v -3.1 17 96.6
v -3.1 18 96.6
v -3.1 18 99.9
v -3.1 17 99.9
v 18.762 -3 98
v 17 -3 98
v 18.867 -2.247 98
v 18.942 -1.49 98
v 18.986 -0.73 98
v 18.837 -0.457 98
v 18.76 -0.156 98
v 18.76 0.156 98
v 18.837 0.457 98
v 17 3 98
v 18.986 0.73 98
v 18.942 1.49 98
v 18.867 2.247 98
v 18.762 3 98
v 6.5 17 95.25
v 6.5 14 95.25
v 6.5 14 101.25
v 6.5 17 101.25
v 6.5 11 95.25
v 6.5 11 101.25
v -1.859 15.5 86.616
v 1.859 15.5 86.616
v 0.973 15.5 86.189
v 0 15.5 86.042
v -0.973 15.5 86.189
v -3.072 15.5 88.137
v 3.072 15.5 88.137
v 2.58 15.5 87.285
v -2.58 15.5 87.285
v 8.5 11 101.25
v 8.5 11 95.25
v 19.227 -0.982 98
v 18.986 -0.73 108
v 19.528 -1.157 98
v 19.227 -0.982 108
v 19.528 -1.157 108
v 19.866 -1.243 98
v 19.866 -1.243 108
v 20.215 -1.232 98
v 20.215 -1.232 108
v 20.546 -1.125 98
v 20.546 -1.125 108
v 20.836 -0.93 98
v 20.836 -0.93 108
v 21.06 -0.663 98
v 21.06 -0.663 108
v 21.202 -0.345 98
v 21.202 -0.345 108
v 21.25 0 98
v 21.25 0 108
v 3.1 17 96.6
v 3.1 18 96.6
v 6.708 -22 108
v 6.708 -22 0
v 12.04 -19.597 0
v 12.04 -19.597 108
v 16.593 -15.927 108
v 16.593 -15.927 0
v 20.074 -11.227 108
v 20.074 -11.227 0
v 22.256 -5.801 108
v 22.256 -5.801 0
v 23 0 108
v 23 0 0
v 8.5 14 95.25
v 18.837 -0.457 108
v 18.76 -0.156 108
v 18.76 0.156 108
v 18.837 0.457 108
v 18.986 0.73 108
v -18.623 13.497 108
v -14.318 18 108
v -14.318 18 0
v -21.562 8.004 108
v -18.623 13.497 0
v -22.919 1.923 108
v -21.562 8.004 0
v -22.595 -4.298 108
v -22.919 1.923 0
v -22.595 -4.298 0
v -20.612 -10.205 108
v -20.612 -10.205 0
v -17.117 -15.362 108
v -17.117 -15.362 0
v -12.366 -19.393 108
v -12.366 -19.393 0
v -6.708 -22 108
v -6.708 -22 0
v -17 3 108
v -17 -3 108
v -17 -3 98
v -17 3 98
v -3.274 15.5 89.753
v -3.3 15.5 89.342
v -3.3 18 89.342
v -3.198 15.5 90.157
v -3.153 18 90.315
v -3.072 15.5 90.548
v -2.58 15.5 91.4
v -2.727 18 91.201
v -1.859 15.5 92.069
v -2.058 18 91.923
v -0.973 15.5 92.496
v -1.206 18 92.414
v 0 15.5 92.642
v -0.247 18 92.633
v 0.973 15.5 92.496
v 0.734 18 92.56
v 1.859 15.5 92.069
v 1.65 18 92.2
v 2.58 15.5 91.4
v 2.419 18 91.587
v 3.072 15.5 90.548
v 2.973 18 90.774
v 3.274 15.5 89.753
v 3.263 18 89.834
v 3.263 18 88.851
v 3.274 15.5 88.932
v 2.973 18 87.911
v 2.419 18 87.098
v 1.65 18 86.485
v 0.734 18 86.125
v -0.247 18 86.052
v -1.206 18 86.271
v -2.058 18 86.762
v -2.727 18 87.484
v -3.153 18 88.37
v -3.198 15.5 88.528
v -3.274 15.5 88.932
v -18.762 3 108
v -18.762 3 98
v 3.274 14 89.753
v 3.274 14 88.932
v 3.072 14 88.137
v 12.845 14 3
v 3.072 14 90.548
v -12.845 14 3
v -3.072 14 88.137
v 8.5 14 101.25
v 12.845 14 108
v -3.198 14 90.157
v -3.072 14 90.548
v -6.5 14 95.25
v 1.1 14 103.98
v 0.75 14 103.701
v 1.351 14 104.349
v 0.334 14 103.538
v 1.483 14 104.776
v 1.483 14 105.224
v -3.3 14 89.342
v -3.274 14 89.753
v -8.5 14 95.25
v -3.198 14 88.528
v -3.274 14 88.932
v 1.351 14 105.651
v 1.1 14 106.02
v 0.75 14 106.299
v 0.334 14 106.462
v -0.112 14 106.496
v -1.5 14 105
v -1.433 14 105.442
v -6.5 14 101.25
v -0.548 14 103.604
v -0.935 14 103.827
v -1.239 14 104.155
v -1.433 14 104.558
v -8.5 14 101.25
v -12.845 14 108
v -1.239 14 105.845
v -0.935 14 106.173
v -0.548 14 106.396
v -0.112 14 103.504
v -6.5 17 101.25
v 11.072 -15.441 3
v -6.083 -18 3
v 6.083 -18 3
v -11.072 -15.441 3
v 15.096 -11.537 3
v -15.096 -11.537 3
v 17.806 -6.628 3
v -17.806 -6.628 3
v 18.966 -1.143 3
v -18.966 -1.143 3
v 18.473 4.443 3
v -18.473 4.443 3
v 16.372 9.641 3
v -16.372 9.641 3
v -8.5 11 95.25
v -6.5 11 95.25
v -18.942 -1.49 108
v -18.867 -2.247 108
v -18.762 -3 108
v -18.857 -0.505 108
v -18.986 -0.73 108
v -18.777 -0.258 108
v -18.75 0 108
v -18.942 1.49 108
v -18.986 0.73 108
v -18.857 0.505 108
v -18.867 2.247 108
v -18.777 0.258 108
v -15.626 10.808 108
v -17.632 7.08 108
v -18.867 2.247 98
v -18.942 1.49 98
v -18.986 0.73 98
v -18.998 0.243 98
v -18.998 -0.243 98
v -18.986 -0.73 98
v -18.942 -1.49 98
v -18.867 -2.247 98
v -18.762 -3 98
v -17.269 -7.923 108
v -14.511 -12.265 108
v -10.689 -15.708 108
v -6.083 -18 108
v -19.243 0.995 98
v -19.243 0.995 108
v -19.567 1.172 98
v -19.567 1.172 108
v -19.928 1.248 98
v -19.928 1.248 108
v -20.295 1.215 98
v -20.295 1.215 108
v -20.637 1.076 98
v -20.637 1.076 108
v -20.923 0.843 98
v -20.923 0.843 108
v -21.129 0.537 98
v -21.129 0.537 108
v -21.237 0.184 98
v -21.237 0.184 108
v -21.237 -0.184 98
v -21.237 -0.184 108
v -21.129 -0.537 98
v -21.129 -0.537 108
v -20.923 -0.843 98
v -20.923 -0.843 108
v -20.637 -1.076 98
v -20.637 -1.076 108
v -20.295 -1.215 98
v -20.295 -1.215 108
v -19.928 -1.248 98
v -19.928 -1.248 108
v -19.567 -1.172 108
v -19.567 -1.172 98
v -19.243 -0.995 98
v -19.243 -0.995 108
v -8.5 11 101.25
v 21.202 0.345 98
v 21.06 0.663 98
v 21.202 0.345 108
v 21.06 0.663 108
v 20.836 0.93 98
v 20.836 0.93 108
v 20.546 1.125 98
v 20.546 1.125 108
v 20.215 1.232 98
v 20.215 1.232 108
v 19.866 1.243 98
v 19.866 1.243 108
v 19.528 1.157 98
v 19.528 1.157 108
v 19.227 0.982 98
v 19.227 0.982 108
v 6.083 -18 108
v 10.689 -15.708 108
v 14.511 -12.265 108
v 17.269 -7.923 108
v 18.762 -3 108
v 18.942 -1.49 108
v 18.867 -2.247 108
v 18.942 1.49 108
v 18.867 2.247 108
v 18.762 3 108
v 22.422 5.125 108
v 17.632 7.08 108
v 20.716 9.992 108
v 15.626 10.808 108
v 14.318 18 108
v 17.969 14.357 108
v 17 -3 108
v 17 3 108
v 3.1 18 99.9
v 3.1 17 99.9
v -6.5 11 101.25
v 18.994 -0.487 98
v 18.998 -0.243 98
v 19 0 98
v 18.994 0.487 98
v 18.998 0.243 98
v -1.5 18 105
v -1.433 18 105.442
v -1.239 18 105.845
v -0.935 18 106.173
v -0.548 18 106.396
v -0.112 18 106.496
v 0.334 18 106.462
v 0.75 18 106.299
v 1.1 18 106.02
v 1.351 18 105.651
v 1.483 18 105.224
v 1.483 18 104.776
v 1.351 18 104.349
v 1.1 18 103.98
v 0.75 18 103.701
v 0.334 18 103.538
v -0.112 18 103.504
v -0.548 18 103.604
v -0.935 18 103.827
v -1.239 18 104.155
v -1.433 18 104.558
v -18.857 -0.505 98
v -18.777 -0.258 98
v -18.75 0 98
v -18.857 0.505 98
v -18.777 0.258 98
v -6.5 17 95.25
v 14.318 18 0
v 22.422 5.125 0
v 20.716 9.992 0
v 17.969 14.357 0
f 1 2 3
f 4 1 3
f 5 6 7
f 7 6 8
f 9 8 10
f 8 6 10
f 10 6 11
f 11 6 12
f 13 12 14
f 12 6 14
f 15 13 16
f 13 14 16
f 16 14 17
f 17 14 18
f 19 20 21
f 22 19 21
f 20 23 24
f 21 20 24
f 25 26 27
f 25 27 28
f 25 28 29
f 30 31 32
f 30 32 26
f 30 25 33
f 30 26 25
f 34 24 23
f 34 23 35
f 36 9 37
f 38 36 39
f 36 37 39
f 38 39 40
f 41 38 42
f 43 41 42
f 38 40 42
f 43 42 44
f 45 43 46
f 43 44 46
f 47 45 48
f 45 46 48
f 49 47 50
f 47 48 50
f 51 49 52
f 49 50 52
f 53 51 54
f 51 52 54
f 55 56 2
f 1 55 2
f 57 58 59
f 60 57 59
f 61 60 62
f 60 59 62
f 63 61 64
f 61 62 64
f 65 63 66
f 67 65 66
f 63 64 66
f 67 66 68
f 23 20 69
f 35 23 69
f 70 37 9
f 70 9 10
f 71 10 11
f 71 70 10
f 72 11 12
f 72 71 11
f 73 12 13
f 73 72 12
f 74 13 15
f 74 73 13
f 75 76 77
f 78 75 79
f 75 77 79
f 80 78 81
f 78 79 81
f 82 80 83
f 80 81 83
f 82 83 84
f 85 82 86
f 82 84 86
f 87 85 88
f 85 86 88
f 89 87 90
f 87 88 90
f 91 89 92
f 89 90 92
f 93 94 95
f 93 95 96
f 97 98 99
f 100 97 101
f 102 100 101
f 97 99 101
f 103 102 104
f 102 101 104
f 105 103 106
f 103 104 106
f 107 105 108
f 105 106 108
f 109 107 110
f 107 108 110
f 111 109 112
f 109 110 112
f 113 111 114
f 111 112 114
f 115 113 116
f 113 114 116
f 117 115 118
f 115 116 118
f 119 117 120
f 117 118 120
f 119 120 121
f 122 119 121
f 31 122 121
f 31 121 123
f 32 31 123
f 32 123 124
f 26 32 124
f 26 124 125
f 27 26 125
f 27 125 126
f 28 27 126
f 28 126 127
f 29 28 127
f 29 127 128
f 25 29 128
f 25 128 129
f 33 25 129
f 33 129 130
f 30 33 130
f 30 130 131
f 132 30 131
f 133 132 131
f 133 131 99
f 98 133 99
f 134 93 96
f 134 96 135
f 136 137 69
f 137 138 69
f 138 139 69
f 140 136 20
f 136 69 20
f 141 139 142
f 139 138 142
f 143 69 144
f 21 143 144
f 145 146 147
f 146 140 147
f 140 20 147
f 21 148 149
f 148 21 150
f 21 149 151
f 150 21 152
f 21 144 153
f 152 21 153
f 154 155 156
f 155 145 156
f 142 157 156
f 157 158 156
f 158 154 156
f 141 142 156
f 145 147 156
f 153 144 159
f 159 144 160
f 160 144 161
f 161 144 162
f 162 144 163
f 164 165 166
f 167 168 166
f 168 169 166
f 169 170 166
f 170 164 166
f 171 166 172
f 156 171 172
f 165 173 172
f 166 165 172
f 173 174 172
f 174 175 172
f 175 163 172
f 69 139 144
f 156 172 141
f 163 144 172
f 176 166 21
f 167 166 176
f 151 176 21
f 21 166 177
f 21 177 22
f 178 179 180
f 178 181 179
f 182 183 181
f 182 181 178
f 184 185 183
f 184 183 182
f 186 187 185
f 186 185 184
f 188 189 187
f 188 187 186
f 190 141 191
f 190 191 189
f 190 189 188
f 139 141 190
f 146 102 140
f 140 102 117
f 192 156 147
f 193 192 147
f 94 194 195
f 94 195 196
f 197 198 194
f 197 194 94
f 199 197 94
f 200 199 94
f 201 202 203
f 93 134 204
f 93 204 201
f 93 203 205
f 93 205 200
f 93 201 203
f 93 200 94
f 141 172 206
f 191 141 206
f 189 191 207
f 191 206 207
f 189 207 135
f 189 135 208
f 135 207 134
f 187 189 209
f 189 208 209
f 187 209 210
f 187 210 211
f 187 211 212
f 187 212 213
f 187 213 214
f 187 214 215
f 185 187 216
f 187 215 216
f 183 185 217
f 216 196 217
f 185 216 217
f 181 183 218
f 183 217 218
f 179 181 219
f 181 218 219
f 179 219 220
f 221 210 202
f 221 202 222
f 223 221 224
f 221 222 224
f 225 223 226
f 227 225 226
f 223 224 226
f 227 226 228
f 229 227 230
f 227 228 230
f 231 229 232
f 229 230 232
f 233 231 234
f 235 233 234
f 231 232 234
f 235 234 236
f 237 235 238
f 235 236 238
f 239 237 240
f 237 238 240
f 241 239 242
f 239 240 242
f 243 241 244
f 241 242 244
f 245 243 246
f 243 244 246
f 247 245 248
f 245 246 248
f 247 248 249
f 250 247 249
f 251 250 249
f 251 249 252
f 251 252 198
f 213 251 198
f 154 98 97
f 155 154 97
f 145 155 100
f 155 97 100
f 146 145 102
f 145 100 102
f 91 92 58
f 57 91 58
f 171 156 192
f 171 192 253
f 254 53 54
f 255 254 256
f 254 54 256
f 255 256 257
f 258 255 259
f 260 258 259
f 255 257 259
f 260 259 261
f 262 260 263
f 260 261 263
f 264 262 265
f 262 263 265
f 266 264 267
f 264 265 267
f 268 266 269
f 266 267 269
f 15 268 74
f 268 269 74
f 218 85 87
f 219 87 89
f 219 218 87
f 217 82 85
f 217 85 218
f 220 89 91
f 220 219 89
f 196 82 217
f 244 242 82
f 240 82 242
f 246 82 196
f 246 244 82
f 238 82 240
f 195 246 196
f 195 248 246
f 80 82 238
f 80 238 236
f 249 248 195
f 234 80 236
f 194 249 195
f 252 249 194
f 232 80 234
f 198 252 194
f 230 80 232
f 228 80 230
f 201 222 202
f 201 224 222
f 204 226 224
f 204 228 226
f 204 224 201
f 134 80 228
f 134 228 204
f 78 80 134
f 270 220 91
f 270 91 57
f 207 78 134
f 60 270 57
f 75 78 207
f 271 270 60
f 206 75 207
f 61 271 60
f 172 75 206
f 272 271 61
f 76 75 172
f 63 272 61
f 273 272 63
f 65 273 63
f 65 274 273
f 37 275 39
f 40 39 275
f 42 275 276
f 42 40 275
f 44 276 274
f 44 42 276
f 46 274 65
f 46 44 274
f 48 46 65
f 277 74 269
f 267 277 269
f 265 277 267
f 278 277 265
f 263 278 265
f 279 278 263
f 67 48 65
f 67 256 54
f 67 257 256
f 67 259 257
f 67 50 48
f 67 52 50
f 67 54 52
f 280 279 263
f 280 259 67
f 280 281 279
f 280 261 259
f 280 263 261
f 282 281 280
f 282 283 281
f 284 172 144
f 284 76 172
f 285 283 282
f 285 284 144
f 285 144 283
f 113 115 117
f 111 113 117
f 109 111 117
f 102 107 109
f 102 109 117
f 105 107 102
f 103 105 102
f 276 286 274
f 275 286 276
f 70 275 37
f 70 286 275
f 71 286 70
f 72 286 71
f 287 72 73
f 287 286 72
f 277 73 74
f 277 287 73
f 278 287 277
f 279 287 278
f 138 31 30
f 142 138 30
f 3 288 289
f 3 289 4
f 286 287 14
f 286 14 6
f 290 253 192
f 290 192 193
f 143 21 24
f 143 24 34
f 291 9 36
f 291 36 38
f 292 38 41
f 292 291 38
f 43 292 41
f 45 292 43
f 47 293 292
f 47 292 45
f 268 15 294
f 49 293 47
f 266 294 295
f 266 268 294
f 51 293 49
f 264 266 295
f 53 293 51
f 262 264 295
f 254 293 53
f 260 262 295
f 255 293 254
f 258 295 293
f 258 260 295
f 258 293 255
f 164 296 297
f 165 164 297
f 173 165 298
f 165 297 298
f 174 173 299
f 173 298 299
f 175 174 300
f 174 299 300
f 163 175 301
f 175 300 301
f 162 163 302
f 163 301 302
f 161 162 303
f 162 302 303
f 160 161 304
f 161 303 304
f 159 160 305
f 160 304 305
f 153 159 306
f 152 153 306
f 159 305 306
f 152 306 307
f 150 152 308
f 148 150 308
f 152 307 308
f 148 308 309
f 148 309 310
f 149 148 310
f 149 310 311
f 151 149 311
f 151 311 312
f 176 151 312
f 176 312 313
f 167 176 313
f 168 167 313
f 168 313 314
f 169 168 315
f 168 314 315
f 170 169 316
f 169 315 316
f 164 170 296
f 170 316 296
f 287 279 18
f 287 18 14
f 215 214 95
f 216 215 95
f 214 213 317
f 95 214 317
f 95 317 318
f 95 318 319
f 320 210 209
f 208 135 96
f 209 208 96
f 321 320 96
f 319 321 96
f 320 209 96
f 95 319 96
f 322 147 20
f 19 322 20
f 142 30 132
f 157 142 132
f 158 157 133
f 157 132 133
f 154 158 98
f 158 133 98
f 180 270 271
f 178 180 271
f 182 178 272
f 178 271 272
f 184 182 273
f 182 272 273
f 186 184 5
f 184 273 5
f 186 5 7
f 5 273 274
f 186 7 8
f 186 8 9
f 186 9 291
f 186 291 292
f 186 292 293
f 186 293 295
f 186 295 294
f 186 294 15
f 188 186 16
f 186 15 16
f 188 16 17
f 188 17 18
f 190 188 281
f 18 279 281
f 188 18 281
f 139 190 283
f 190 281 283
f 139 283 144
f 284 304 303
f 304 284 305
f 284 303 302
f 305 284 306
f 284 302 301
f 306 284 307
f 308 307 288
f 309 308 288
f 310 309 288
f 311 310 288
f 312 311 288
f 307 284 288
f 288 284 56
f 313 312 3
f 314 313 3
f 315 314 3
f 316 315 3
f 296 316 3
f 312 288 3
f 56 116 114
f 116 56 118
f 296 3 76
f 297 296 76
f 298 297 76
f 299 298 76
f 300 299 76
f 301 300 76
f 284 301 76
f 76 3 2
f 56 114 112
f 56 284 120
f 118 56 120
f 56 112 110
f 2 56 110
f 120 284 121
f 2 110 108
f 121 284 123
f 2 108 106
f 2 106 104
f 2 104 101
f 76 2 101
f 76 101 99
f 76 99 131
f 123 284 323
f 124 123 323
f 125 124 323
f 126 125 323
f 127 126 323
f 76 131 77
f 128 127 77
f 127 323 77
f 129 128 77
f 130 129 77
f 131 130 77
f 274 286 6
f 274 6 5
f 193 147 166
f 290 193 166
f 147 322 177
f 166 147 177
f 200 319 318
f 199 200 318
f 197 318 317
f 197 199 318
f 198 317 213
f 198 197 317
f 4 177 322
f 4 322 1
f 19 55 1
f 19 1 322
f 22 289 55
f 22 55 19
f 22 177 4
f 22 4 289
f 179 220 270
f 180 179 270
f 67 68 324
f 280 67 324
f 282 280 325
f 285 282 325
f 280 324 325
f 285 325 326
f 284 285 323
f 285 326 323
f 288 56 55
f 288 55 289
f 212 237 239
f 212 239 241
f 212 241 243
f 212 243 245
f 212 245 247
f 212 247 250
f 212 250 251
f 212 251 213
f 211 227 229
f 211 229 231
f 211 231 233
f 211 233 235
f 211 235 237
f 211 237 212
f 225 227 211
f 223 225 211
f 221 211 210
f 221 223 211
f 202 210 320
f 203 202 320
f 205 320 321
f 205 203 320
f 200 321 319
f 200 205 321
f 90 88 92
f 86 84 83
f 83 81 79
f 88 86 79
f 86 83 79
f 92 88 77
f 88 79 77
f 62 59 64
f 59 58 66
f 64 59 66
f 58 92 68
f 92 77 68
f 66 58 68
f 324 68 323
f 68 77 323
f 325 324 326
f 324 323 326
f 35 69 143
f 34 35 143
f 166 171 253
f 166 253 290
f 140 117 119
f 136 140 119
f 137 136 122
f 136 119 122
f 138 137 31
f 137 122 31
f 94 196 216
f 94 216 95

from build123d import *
from build123d import SkipClean  # not in build123d's __all__

# Parameters (mm, degrees)
F1_DEPTH  = 108
F3_DEPTH  = 105
F4_W      = 6.2
F4_H      = 3.3
F5_DEPTH  = 4
F4_R      = 3.3
F6_DEPTH  = 2.5
F8_DEPTH  = 1.5
F4_R_2    = 1.5
F9_DEPTH  = 4
F10_W     = 13
F10_H     = 6
F10_W_2   = 6.2
F10_H_2   = 3.3
F11_DEPTH = 3
F10_W_3   = 2
F12_DEPTH = 3
F14_DEPTH = 10
F15_DEPTH = 10


# Not quite as in the source:
# - a feature names something its author has since deleted; it is built from what else it names


with BuildPart() as f1:
    # F0 (on Top) → F1 (new body)
    with BuildSketch(Plane.XY):
        with BuildLine():
            ThreePointArc((6.7082039325, -22), (18.4836237038, -13.6877921805), (23, 0))
            ThreePointArc((23, 0), (20.7160551802, 9.9922498854), (14.3178210633, 18))
            Line((14.3178210633, 18), (-14.3178210633, 18))
            ThreePointArc((-14.3178210633, 18), (-22.5947655837, -4.2984378813), (-6.7082039325, -22))
            Line((-6.7082039325, -22), (6.7082039325, -22))
        make_face()
    extrude(amount=F1_DEPTH)

    # F2 (on face) → F3 (cut)
    with BuildSketch(Plane.XY.offset(108)):
        with BuildLine():
            Line((-6.0827625303, -18), (6.0827625303, -18))
            ThreePointArc((6.0827625303, -18), (18.5894391984, -3.9284539311), (12.8452325787, 14))
            Line((12.8452325787, 14), (-12.8452325787, 14))
            ThreePointArc((-12.8452325787, 14), (-18.5894391984, -3.9284539311), (-6.0827625303, -18))
        make_face()
    extrude(amount=-F3_DEPTH, mode=Mode.SUBTRACT)

    # F4 (on face) → F5 (cut)
    with BuildSketch(Plane(origin=(0, 18, 0), x_dir=(-1, 0, 0), z_dir=(0, 1, 0))):
        with Locations((0, 98.25)):
            Rectangle(F4_W, F4_H)
    extrude(amount=-F5_DEPTH, mode=Mode.SUBTRACT)

    # F4 (on face) → F6 (cut)
    with BuildSketch(Plane(origin=(0, 18, 0), x_dir=(-1, 0, 0), z_dir=(0, 1, 0))):
        with Locations((0, 89.3424802274)):
            Circle(F4_R)
    extrude(amount=-F6_DEPTH, mode=Mode.SUBTRACT)

    # F7 (on face) → F8 (cut)
    with BuildSketch(Plane(origin=(0, 15.5, 0), x_dir=(-1, 0, 0), z_dir=(0, 1, 0))):
        with BuildLine():
            ThreePointArc((3.3, 89.3424802274), (3.2424742607, 89.9559626385), (3.0719026249, 90.5480565471))
            Line((3.0719026249, 90.5480565471), (-3.0719026249, 90.5480565471))
            ThreePointArc((-3.0719026249, 90.5480565471), (-3.3, 89.3424802274), (-3.0719026249, 88.1369039076))
            Line((-3.0719026249, 88.1369039076), (3.0719026249, 88.1369039076))
            ThreePointArc((3.0719026249, 88.1369039076), (3.2424742607, 88.7289978162), (3.3, 89.3424802274))
        make_face()
    extrude(amount=-F8_DEPTH, mode=Mode.SUBTRACT)

    # F4 (on face) → F9 (cut)
    with BuildSketch(Plane(origin=(0, 18, 0), x_dir=(-1, 0, 0), z_dir=(0, 1, 0))):
        with Locations((0, 105)):
            Circle(F4_R_2)
    extrude(amount=-F9_DEPTH, mode=Mode.SUBTRACT)

    # F10 (on face) → F11 (cut)
    with BuildSketch(Plane.XZ.offset(-14)):
        with Locations((0, 98.25)):
            Rectangle(F10_W, F10_H)
        with Locations((0, 98.25)):
            Rectangle(F10_W_2, F10_H_2, mode=Mode.SUBTRACT)
    extrude(amount=-F11_DEPTH, mode=Mode.SUBTRACT)

    # F10 (on face) → F12 (join)
    with BuildSketch(Plane.XZ.offset(-14)):
        with Locations((-7.5, 98.25)):
            Rectangle(F10_W_3, F10_H)
        with Locations((7.5, 98.25)):
            Rectangle(F10_W_3, F10_H)
    extrude(amount=F12_DEPTH)

    # F13 (on face) → F14 (cut)
    with BuildSketch(Plane.XY.offset(108)):
        with BuildLine():
            ThreePointArc((21.2504766076, 0), (20.3841146719, 1.1896729952), (18.9859616706, 0.7302461521))
            ThreePointArc((18.9859616706, 0.7302461521), (18.9964900935, 0.3651905384), (19, 0))
            ThreePointArc((19, 0), (18.9964900935, -0.3651905384), (18.9859616706, -0.7302461521))
            ThreePointArc((18.9859616706, -0.7302461521), (20.3841146719, -1.1896729952), (21.2504766076, 0))
        make_face()
        with BuildLine():
            ThreePointArc((-18.9859616706, -0.7302461521), (-19, 0), (-18.9859616706, 0.7302461521))
            ThreePointArc((-18.9859616706, 0.7302461521), (-21.2504766076, 0), (-18.9859616706, -0.7302461521))
        make_face()
    extrude(amount=-F14_DEPTH, mode=Mode.SUBTRACT)

    # F13 (on face) → F15 (join)
    with BuildSketch(Plane.XY.offset(108)):
        with BuildLine():
            ThreePointArc((18.9859616706, 0.7302461521), (18.9079014817, 1.8684917869), (18.7616630393, 3))
            Line((18.7616630393, 3), (17.0004766076, 3))
            Line((17.0004766076, 3), (17.0004766076, -3))
            Line((17.0004766076, -3), (18.7616630393, -3))
            ThreePointArc((18.7616630393, -3), (18.9079014817, -1.8684917869), (18.9859616706, -0.7302461521))
            ThreePointArc((18.9859616706, -0.7302461521), (18.7504766076, 0), (18.9859616706, 0.7302461521))
        make_face()
        with BuildLine():
            Line((-17.0004766076, 3), (-18.7616630393, 3))
            ThreePointArc((-18.7616630393, 3), (-18.9079014817, 1.8684917869), (-18.9859616706, 0.7302461521))
            ThreePointArc((-18.9859616706, 0.7302461521), (-18.8108036123, 0.3836380643), (-18.7504766076, 0))
            ThreePointArc((-18.7504766076, 0), (-18.8108036123, -0.3836380643), (-18.9859616706, -0.7302461521))
            ThreePointArc((-18.9859616706, -0.7302461521), (-18.9079014817, -1.8684917869), (-18.7616630393, -3))
            Line((-18.7616630393, -3), (-17.0004766076, -3))
            Line((-17.0004766076, -3), (-17.0004766076, 3))
        make_face()
    with SkipClean():  # cleaning this boolean's faces spoils the solid; the shape is the same uncleaned
        extrude(amount=-F15_DEPTH)


solid = f1.part
